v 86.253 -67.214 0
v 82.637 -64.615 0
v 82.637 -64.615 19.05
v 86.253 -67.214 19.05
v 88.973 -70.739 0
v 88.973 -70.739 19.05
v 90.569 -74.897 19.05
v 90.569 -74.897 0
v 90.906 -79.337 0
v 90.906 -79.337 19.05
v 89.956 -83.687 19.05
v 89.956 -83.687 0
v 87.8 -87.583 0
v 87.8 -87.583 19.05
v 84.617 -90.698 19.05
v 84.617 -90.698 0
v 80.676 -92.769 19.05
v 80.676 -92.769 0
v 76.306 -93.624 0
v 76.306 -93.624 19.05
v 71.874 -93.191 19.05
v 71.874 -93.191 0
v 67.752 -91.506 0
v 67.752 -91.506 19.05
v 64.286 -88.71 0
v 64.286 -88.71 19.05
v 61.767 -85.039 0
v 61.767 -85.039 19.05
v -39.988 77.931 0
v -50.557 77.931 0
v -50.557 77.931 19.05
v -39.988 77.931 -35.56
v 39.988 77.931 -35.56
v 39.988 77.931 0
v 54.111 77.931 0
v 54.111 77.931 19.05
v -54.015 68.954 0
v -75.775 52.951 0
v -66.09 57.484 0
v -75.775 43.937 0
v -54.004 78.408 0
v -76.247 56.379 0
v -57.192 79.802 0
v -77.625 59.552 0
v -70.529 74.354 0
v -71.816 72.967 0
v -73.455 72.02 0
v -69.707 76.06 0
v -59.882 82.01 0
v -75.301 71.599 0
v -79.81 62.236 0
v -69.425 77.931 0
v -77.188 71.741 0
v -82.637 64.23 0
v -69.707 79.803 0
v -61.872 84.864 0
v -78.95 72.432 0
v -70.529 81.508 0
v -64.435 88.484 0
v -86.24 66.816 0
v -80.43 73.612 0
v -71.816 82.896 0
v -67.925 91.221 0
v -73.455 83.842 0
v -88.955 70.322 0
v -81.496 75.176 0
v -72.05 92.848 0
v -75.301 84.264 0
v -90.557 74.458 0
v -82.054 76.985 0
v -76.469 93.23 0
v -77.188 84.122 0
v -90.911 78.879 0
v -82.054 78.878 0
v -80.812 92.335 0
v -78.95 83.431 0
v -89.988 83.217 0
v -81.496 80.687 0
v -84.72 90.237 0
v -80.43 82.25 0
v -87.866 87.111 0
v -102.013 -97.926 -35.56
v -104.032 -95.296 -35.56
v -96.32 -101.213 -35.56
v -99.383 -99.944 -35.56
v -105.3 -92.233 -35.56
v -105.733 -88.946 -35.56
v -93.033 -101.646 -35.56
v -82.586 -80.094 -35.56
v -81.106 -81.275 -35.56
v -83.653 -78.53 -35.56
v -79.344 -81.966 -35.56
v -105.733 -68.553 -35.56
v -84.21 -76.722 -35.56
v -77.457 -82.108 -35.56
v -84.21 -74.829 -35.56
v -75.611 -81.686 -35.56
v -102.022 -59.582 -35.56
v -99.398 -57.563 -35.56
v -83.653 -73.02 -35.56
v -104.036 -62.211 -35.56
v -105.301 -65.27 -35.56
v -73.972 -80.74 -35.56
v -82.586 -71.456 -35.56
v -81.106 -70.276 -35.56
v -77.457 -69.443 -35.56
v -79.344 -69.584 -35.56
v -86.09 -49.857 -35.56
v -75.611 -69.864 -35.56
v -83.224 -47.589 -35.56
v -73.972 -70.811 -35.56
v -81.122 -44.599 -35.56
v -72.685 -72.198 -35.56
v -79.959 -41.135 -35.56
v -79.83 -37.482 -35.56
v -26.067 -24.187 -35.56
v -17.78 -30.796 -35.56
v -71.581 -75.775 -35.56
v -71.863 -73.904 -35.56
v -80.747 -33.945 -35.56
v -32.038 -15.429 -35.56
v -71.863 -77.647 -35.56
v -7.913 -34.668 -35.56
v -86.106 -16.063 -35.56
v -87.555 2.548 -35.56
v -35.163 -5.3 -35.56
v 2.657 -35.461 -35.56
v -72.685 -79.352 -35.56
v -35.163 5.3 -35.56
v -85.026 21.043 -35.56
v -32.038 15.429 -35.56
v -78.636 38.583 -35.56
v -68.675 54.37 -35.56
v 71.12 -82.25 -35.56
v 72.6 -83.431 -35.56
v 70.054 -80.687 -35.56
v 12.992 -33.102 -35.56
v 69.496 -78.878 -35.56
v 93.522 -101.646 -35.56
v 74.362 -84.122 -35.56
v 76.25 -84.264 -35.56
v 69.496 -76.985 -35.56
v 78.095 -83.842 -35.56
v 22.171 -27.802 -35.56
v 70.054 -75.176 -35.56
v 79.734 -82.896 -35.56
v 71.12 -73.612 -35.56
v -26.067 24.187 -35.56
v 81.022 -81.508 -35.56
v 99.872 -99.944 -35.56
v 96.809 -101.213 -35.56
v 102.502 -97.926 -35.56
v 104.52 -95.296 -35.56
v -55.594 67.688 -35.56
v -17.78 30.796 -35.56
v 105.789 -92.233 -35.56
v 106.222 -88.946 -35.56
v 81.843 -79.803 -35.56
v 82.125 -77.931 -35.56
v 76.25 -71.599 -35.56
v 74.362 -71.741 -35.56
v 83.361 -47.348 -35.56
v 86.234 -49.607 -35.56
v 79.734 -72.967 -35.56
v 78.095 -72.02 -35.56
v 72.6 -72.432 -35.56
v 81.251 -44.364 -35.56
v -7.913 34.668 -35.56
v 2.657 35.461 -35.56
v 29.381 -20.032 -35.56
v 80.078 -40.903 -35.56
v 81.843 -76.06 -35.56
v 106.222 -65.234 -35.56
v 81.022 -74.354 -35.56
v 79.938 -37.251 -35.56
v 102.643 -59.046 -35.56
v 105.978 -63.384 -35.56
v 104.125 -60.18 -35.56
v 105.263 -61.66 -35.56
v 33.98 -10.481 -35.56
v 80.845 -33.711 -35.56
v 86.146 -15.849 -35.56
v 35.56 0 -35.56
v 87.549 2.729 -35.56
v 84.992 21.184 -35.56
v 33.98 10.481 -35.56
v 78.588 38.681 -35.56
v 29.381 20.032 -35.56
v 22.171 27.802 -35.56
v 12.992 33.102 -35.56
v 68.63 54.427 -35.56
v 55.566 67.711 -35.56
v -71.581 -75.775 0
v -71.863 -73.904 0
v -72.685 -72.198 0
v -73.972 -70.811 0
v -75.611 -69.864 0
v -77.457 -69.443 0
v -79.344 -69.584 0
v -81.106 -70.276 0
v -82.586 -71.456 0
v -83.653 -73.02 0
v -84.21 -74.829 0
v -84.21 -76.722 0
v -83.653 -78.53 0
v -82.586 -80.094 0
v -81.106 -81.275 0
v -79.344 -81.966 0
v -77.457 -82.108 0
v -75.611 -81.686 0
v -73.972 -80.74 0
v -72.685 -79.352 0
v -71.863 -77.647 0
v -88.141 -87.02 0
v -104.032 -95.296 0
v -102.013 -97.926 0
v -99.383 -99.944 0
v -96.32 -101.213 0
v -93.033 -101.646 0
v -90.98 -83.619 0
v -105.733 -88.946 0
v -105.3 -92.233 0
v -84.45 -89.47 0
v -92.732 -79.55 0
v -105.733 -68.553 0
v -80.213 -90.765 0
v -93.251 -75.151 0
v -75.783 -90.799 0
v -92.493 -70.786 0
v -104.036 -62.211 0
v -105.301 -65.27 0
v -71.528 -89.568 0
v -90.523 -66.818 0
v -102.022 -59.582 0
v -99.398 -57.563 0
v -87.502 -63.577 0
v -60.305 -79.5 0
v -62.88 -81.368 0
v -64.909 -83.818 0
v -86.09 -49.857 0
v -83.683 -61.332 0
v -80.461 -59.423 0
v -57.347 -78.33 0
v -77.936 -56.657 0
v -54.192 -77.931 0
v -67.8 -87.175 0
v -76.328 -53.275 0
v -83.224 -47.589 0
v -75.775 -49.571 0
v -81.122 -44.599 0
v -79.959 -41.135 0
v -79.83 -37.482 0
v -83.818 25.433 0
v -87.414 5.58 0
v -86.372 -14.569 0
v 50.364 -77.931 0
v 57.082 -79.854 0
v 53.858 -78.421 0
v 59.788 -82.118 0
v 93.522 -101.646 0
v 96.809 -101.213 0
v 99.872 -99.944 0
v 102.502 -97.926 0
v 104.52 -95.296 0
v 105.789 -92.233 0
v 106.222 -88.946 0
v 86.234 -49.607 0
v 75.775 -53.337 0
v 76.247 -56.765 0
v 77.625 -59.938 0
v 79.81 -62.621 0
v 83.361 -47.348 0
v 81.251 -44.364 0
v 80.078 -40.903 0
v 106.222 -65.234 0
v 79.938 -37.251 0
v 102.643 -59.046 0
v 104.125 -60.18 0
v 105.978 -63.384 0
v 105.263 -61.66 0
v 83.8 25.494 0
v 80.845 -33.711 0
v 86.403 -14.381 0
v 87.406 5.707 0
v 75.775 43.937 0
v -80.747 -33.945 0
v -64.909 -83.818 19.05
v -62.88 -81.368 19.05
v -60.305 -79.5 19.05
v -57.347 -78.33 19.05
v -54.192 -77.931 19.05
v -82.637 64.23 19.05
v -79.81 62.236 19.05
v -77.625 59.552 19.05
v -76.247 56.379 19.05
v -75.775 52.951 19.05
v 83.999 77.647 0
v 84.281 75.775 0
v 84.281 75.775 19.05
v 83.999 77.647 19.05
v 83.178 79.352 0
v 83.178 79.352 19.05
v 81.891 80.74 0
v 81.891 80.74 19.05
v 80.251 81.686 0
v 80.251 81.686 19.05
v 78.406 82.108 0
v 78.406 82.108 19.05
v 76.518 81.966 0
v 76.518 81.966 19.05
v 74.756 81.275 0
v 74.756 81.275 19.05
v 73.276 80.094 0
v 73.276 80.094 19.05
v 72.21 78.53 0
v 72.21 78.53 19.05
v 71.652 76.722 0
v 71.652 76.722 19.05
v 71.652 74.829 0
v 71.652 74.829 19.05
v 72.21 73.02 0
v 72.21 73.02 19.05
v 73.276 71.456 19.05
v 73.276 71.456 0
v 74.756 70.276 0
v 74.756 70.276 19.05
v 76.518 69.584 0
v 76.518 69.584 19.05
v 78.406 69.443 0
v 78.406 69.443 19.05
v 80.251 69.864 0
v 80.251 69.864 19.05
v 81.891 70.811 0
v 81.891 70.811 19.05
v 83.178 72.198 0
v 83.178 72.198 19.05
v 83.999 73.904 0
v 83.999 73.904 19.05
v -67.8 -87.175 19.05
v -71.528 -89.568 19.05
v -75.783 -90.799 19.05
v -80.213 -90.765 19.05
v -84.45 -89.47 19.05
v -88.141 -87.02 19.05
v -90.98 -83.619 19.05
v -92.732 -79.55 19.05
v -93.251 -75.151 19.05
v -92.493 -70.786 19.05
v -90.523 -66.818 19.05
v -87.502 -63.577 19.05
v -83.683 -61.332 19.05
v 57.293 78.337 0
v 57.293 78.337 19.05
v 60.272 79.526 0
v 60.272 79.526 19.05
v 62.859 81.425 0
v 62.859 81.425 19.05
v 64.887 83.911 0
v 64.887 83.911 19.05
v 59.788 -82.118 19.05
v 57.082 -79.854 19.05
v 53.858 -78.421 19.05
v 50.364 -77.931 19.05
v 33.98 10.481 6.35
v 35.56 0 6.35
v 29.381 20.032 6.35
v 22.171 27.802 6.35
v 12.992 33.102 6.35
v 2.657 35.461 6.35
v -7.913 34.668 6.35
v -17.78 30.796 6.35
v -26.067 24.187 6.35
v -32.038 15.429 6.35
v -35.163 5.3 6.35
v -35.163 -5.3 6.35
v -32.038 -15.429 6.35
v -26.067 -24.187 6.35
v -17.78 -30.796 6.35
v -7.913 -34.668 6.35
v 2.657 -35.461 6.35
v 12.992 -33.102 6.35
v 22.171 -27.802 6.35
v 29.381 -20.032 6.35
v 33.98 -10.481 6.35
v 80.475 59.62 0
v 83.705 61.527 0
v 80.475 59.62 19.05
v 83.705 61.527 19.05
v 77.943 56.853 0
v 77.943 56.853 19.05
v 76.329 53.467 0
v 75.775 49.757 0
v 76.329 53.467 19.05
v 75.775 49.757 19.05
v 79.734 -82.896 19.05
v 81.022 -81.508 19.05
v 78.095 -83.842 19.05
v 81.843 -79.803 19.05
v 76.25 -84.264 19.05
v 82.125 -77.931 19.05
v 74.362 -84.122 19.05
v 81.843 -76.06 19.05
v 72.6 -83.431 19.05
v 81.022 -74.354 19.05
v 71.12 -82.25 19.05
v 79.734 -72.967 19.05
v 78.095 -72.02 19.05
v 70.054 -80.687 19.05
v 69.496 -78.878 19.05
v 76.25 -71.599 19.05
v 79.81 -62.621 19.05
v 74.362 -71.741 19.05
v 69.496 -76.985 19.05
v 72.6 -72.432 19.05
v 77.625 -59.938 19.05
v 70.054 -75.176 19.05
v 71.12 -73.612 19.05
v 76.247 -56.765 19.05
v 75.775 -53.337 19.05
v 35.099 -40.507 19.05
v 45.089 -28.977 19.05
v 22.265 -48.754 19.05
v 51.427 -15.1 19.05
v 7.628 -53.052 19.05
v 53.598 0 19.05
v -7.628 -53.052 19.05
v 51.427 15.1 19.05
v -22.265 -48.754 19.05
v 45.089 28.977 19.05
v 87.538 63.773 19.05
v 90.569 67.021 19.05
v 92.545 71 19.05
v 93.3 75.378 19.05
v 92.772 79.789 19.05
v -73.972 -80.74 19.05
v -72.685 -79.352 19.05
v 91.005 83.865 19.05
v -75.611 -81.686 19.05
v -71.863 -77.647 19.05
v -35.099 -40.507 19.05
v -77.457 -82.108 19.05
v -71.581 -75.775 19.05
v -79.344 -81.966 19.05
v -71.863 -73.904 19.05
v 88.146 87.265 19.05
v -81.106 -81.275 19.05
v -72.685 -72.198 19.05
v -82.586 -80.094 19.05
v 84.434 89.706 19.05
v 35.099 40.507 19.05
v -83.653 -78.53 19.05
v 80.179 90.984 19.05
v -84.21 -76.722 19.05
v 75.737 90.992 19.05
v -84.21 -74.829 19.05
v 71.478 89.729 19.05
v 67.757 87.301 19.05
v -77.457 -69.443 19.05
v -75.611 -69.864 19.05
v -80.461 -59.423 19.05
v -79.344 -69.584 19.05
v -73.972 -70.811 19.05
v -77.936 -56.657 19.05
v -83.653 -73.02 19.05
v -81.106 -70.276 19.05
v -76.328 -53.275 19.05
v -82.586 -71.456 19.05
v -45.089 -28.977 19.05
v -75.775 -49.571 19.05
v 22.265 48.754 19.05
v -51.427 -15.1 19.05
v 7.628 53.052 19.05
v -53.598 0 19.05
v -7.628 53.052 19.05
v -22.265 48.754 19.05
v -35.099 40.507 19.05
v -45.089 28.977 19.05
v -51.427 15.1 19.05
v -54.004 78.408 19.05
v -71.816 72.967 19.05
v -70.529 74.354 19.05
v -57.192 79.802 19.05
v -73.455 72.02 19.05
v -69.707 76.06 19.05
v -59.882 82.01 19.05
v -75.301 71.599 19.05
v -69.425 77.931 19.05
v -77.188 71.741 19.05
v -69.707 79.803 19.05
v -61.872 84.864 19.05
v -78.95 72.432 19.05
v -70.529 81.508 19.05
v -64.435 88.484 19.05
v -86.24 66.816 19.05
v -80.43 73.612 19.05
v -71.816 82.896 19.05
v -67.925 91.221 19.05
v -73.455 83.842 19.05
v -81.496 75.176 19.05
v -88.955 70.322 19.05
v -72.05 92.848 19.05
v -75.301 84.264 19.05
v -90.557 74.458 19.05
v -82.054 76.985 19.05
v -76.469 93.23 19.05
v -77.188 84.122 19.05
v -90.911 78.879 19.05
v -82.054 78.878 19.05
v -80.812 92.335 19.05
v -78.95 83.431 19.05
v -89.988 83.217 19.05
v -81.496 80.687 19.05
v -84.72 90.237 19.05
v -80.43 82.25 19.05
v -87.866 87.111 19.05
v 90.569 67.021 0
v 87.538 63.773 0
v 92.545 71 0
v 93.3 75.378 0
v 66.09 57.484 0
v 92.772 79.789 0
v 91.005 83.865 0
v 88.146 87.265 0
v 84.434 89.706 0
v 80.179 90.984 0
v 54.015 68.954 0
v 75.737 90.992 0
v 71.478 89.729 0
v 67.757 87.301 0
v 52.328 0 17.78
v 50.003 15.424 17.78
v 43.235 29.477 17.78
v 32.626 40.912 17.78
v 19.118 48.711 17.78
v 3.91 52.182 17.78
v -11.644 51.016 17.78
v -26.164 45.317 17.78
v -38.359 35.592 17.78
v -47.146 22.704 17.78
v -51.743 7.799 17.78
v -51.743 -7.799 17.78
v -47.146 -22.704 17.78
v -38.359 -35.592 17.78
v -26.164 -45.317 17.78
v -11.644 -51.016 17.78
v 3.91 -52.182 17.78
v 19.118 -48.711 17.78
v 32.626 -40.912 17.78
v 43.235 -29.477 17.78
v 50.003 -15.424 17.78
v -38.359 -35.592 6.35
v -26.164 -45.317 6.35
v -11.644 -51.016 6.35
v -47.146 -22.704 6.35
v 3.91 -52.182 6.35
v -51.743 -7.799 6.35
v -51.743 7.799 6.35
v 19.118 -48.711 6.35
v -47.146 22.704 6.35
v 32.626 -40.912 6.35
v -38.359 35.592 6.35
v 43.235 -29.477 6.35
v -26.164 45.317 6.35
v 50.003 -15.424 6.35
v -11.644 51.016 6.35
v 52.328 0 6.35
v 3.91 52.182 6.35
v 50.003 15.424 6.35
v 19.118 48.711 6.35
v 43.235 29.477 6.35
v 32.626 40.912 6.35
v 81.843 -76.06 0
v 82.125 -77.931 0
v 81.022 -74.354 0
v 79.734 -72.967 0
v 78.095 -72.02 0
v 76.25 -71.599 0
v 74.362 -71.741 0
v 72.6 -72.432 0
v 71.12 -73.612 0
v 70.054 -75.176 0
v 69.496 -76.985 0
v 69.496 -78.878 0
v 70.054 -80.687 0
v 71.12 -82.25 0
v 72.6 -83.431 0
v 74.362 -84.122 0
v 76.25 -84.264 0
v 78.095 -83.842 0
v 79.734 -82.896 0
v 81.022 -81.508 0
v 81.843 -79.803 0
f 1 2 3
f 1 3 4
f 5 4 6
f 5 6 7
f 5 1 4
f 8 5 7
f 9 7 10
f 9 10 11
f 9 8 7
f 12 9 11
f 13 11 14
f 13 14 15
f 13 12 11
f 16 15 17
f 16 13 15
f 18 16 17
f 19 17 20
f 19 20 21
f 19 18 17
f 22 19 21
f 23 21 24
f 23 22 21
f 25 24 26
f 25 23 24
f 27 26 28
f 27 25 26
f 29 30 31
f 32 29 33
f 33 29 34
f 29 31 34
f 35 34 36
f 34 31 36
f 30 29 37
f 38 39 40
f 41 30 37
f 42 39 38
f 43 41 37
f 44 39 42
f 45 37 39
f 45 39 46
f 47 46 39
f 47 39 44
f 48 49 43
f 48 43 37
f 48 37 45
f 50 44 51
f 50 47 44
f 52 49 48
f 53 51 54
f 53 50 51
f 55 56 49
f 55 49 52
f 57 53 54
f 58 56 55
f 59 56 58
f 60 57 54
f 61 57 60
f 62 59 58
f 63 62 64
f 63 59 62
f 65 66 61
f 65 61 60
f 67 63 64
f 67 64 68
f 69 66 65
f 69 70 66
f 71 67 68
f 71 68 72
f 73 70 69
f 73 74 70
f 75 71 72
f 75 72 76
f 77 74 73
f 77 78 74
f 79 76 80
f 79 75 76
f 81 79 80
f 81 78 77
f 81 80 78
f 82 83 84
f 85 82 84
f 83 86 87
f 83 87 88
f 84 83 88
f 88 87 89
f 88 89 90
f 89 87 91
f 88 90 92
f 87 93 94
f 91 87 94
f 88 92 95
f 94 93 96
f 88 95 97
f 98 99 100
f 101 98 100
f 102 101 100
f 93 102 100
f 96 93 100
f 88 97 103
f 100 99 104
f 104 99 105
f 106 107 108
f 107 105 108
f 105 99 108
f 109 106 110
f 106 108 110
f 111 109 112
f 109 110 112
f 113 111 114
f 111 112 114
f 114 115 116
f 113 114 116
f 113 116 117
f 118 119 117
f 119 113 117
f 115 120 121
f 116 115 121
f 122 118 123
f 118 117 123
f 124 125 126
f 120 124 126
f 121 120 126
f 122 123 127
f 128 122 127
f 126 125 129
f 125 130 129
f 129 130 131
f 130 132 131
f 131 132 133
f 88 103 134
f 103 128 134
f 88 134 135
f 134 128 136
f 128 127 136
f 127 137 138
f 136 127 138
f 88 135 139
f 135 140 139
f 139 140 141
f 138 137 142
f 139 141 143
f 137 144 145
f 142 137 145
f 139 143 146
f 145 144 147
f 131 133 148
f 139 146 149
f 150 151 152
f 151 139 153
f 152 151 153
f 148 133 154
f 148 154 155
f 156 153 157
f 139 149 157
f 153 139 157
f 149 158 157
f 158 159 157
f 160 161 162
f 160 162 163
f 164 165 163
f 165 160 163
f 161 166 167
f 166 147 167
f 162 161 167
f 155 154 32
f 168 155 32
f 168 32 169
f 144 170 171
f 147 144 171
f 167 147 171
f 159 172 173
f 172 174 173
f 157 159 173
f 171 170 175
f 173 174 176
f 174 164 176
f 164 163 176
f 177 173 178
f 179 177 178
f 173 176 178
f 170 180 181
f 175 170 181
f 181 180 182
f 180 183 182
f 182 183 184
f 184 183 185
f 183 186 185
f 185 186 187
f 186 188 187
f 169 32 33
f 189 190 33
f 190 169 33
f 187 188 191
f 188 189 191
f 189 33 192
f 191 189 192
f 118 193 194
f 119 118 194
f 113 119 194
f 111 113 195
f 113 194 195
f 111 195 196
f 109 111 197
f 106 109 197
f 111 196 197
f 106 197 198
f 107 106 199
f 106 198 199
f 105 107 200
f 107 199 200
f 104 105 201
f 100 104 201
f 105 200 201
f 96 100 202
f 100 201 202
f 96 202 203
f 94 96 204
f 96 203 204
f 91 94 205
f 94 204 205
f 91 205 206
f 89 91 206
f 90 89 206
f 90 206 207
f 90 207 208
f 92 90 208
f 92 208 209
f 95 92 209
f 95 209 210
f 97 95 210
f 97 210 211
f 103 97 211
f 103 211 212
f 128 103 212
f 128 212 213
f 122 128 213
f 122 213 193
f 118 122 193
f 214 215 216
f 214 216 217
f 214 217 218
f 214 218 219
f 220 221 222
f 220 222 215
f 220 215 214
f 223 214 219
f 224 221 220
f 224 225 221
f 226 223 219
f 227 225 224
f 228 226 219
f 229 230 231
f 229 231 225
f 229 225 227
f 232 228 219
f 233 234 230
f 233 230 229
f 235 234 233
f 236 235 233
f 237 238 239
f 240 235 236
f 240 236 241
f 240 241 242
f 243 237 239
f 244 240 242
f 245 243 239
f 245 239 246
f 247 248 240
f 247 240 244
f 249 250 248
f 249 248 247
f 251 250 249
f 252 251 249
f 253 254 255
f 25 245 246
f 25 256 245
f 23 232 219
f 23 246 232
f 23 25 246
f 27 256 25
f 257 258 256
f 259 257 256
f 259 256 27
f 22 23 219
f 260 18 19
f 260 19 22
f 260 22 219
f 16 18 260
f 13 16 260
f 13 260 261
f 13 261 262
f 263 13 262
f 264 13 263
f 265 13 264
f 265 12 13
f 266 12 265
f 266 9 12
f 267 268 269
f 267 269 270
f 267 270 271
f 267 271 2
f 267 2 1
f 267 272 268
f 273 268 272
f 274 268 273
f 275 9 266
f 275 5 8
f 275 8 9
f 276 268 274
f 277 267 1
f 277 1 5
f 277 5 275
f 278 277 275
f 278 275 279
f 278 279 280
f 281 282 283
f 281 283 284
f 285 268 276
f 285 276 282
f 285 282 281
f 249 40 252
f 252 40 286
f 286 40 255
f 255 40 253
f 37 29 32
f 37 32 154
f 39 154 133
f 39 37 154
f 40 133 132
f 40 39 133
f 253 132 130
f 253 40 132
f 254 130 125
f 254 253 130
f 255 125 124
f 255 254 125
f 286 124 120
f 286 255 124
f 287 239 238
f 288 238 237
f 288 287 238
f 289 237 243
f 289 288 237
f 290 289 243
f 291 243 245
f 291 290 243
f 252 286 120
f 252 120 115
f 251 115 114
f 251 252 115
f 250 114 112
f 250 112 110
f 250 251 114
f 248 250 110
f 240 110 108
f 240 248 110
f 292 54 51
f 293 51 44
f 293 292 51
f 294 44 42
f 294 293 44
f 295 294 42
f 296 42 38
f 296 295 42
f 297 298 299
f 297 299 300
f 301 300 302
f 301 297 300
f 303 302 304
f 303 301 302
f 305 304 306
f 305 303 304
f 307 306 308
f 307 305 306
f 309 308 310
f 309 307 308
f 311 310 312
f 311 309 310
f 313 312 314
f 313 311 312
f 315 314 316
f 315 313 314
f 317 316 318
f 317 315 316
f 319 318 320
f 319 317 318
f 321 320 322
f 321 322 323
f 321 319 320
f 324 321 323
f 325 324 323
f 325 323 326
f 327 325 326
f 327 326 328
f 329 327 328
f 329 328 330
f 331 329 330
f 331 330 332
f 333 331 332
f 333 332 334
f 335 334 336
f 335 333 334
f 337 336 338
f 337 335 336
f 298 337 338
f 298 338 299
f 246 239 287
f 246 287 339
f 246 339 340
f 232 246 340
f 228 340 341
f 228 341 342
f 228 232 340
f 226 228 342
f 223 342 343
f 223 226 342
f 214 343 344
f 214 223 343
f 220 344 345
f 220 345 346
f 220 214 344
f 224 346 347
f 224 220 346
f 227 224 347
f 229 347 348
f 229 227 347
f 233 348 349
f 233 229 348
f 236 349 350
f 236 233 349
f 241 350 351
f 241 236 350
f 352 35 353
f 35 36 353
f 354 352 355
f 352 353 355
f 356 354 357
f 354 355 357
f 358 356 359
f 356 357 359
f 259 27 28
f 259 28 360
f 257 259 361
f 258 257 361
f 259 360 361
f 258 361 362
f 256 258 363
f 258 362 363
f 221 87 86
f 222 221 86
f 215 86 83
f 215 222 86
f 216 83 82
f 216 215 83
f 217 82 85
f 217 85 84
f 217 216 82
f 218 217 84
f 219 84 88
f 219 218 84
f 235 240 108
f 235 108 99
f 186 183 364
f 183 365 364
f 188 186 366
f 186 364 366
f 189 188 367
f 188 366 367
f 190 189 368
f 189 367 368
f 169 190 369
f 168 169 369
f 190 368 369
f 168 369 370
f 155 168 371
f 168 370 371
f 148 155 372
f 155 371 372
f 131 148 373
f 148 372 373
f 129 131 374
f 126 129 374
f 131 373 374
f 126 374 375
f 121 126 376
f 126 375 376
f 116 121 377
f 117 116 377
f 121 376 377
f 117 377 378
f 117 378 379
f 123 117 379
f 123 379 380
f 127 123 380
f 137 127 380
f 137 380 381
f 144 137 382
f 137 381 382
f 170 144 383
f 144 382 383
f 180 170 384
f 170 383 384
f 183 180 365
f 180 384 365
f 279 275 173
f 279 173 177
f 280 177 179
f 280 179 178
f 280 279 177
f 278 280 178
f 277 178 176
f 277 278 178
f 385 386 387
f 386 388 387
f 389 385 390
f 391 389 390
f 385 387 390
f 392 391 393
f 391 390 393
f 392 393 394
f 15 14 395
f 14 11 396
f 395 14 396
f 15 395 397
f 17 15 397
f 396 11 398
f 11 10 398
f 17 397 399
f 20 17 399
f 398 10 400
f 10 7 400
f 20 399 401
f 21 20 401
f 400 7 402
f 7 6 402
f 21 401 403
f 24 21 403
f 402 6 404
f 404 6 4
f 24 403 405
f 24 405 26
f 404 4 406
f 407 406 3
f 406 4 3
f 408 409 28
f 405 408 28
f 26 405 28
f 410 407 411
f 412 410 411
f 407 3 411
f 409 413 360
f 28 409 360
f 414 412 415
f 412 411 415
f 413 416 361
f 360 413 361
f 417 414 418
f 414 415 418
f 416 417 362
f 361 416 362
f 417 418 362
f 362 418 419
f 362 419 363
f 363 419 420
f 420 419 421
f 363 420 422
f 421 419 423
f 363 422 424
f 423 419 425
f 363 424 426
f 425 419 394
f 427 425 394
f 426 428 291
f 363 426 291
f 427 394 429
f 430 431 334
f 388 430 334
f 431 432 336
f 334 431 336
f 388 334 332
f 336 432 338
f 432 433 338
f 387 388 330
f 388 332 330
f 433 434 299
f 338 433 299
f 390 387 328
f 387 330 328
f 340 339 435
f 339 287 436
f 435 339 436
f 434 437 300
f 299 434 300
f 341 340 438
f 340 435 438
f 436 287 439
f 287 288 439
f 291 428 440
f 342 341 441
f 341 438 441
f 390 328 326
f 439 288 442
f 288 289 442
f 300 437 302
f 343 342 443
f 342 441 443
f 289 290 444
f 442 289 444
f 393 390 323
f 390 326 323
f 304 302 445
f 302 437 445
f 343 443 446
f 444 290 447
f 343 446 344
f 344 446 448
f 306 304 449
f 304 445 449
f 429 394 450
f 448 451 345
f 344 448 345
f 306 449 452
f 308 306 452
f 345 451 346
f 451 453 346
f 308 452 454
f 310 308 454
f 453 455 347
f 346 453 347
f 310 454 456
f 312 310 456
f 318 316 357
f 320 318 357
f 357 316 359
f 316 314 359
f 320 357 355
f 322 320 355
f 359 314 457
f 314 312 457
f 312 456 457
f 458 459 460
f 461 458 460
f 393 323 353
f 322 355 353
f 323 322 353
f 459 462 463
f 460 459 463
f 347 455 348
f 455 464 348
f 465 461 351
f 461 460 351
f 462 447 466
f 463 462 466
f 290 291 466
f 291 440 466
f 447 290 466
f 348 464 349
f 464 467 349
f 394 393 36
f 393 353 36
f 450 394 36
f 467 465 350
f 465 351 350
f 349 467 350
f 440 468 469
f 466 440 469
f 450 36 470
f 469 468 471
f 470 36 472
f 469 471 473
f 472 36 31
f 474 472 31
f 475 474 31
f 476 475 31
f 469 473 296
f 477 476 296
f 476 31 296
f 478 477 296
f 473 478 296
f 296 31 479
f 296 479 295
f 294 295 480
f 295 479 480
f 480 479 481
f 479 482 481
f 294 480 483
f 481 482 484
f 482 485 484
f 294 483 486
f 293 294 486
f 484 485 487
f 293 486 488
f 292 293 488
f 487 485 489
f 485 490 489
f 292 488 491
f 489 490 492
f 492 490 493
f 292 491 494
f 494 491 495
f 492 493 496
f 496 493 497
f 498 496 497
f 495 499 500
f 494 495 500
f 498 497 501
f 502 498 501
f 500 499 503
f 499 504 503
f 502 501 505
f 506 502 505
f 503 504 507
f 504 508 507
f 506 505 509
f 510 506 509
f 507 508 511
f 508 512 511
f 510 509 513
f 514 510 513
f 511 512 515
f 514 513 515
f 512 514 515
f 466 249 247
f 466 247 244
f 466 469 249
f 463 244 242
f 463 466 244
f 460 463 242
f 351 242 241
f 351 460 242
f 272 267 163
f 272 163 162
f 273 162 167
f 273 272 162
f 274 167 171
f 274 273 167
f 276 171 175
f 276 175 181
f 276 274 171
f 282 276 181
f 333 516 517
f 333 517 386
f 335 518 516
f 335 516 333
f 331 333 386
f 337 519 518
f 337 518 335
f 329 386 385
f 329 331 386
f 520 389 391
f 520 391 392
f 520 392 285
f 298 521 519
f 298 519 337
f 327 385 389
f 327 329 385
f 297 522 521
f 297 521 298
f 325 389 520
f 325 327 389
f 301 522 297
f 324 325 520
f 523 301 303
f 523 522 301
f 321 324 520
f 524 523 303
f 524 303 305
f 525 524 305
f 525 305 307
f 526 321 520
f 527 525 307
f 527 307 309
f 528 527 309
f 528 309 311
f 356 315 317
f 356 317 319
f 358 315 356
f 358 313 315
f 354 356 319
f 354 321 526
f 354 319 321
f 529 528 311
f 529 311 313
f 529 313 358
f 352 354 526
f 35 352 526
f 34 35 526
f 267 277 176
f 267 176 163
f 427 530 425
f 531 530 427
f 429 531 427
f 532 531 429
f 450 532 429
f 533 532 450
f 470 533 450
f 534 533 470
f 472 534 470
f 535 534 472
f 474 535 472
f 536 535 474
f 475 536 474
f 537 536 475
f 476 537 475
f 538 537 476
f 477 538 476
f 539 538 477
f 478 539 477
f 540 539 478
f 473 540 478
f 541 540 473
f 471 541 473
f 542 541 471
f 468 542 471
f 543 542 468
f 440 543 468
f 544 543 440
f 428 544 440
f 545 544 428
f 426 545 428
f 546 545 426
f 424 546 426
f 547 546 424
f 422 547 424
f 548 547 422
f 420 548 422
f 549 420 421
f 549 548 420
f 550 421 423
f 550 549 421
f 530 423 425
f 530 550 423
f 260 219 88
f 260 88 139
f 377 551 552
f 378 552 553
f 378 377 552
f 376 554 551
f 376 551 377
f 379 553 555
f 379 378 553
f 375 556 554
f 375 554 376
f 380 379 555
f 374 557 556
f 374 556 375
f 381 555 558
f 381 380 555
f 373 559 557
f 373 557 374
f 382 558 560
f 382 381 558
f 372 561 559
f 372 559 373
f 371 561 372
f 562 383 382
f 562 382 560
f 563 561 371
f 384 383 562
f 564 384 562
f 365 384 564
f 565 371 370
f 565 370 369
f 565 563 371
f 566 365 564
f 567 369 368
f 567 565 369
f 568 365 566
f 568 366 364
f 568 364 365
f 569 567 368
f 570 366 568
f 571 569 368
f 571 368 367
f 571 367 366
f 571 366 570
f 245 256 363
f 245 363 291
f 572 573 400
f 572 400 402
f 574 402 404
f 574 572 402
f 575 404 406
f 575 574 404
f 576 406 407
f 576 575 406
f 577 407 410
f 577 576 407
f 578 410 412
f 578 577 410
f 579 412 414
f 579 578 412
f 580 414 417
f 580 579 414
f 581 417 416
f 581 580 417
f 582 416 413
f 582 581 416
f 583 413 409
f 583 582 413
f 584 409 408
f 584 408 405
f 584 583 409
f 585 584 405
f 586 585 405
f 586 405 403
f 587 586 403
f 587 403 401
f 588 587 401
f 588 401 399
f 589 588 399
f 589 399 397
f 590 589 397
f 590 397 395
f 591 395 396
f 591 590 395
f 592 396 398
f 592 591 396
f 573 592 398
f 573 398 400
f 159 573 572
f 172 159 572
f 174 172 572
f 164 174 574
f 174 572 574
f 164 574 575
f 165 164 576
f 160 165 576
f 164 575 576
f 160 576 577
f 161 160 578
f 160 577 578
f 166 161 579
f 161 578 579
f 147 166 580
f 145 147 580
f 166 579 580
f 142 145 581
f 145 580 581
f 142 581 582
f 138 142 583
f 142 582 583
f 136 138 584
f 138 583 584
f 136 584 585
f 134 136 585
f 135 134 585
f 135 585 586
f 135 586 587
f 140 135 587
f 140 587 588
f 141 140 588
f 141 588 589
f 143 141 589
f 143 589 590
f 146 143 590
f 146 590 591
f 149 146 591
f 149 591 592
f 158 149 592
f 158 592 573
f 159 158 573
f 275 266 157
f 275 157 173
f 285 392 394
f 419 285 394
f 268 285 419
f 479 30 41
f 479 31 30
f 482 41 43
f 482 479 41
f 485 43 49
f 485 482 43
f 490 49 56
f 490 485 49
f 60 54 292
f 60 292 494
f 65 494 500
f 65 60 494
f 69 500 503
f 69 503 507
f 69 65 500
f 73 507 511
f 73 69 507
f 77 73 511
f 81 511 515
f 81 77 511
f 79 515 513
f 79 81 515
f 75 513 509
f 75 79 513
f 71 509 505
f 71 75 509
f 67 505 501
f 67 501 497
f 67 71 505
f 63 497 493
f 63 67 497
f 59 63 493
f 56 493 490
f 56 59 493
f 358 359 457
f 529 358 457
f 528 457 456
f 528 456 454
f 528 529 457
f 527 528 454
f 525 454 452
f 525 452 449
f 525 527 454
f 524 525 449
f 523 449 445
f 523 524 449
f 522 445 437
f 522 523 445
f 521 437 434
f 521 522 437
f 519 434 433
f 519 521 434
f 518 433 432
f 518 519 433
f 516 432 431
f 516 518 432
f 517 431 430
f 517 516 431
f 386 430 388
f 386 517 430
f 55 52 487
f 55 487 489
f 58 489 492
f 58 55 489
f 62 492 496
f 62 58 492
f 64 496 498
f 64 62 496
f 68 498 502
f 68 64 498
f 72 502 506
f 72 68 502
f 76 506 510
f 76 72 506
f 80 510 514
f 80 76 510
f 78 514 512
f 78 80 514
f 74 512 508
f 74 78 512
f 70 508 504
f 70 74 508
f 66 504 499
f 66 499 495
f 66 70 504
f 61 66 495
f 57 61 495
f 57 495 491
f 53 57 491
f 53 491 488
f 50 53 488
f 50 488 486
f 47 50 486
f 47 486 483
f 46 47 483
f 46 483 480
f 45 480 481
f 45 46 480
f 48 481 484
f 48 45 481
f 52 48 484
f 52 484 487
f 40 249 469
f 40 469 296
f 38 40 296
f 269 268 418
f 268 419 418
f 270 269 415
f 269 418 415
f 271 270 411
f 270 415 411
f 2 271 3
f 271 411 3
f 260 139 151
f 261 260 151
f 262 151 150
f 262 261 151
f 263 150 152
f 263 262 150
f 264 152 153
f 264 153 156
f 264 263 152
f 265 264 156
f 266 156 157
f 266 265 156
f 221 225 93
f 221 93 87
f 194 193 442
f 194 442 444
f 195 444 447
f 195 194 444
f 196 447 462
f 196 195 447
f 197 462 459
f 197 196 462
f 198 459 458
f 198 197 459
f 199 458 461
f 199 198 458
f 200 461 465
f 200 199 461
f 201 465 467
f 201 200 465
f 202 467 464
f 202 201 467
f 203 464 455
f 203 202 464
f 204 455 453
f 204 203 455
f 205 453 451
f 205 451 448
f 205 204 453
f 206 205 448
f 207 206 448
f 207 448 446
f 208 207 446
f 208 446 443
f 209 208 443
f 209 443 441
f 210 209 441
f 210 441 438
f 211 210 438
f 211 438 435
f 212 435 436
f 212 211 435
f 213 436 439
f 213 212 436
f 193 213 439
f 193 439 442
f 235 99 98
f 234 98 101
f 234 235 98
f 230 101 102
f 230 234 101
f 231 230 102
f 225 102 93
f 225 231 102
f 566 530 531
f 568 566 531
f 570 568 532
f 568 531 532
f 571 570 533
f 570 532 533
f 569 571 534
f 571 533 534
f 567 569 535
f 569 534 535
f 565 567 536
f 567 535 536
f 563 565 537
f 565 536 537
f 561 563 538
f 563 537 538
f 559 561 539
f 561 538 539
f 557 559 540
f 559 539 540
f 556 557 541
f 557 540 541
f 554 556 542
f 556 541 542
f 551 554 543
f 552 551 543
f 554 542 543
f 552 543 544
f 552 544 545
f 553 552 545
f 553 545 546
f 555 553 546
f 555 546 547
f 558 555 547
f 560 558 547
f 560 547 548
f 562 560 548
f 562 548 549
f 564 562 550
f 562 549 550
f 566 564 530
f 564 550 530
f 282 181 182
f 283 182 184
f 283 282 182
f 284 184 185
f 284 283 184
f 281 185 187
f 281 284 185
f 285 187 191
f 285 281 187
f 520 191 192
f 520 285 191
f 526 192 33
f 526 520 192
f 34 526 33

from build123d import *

# Parameters (mm, degrees)
SKETCH1_R               = 6.35
EXTRUDE1_DEPTH          = 19.05
FILLET1_R               = 12.7
SKETCH2_R               = 52.327921125
CUT_EXTRUDE2_DEPTH      = 12.7
CHAMFER1_SIZE           = 1.27
EXTRUDE2_DEPTH          = 35.56
SKETCH3_R               = 35.56
CUT_EXTRUDE3_DEPTH      = 20.05
CUT_EXTRUDE3_DEPTH_BACK = 36.56
SKETCH5_W               = 101.416551859
SKETCH5_H               = 41.189513353
CUT_EXTRUDE4_DEPTH      = 40.64
SKETCH7_R               = 6.35
CUT_EXTRUDE6_DEPTH      = 36.56


with BuildPart() as part:
    # Sketch1 → Extrude1 (new body)
    with BuildSketch(Plane.XY):
        with BuildLine():
            Line((-60.195770425, 77.931349549), (62.709585641, 77.931349549))
            ThreePointArc((62.709585641, 77.931349549), (90.219330448, 85.014128276), (75.775284214, 60.553520307))
            Line((75.775284214, 60.553520307), (75.775284214, -62.895919466))
            ThreePointArc((75.775284214, -62.895919466), (86.24662402, -89.329307316), (60.199368708, -77.931349549))
            Line((60.199368708, -77.931349549), (-62.691575683, -77.931349549))
            ThreePointArc((-62.691575683, -77.931349549), (-90.218375384, -84.744460999), (-75.775284214, -60.340766466))
            Line((-75.775284214, -60.340766466), (-75.775284214, 62.510464201))
            ThreePointArc((-75.775284214, 62.510464201), (-86.384477207, 88.809119355), (-60.195770425, 77.931349549))
        make_face()
        with Locations((77.931349549, 75.775284214)):
            Circle(SKETCH1_R, mode=Mode.SUBTRACT)
        with Locations((75.775284214, -77.931349549)):
            Circle(SKETCH1_R, mode=Mode.SUBTRACT)
        with Locations((-77.931349549, -75.775284214)):
            Circle(SKETCH1_R, mode=Mode.SUBTRACT)
        with Locations((-75.775284214, 77.931349549)):
            Circle(SKETCH1_R, mode=Mode.SUBTRACT)
    extrude(amount=EXTRUDE1_DEPTH)

    # Fillet1
    fillet1_edges = [part.edges().sort_by_distance(p)[0] for p in [
        (-75.775284214, -60.340766466, 9.525),
        (-75.775284214, 62.510464201, 9.525),
        (-60.195770425, 77.931349549, 9.525),
        (62.709585641, 77.931349549, 9.525),
        (75.775284214, 60.553520307, 9.525),
        (75.775284214, -62.895919466, 9.525),
        (60.199368708, -77.931349549, 9.525),
        (-62.691575683, -77.931349549, 9.525),
    ]]
    fillet(fillet1_edges, radius=FILLET1_R)

    # Sketch2 → Cut-Extrude2 (cut)
    with BuildSketch(Plane.XY.offset(19.05)):
        Circle(SKETCH2_R)
    extrude(amount=-CUT_EXTRUDE2_DEPTH, mode=Mode.SUBTRACT)

    # Chamfer1
    chamfer1_edges = [part.edges().sort_by_distance(p)[0] for p in [
        (-52.327921125, 0, 19.05),
    ]]
    chamfer(chamfer1_edges, length=CHAMFER1_SIZE)

    # Sketch4 → Extrude2 (add)
    with BuildSketch(Plane(origin=(0, 0, 0), x_dir=(-1, 0, 0), z_dir=(0, 0, -1))):
        with BuildLine():
            Line((86.089983669, -49.856504988), (99.397574405, -57.563208318))
            ThreePointArc((99.397574405, -57.563208318), (104.035719005, -62.2105938), (105.732985822, -68.553295314))
            Line((105.732985822, -68.553295314), (105.732985822, -88.945536156))
            ThreePointArc((105.732985822, -88.945536156), (102.013241943, -97.925792277), (93.032985822, -101.645536156))
            Line((93.032985822, -101.645536156), (-93.521645158, -101.645536156))
            ThreePointArc((-93.521645158, -101.645536156), (-102.501901279, -97.925792277), (-106.221645158, -88.945536156))
            Line((-106.221645158, -88.945536156), (-106.221645158, -65.233714494))
            ThreePointArc((-106.221645158, -65.233714494), (-105.262508623, -61.659777941), (-102.642852051, -59.046281274))
            Line((-102.642852051, -59.046281274), (-86.23402563, -49.606947108))
            ThreePointArc((-86.23402563, -49.606947108), (-80.539133122, -42.676006174), (-80.844982944, -33.710728777))
            ThreePointArc((-80.844982944, -33.710728777), (0.126849431, 87.591714284), (80.747004975, -33.944744652))
            ThreePointArc((80.747004975, -33.944744652), (80.415189643, -42.909098588), (86.089983669, -49.856504988))
        make_face()
    extrude(amount=EXTRUDE2_DEPTH)

    # Sketch3 → Cut-Extrude3 (cut, two sides)
    with BuildSketch(Plane.XY) as cut_extrude3_sk:
        Circle(SKETCH3_R)
    extrude(amount=CUT_EXTRUDE3_DEPTH, mode=Mode.SUBTRACT)
    extrude(cut_extrude3_sk.sketch, amount=-CUT_EXTRUDE3_DEPTH_BACK, mode=Mode.SUBTRACT)

    # Sketch5 → Cut-Extrude4 (cut)
    with BuildSketch(Plane.XY):
        with Locations((-2.36196921, 98.526106226)):
            Rectangle(SKETCH5_W, SKETCH5_H)
    extrude(amount=-CUT_EXTRUDE4_DEPTH, mode=Mode.SUBTRACT)

    # Sketch7 → Cut-Extrude6 (cut, through all)
    with BuildSketch(Plane.XY):
        with Locations((75.775284214, -77.931349549)):
            Circle(SKETCH7_R)
        with Locations((-77.931349549, -75.775284214)):
            Circle(SKETCH7_R)
    extrude(amount=-CUT_EXTRUDE6_DEPTH, mode=Mode.SUBTRACT)


solid = part.part
